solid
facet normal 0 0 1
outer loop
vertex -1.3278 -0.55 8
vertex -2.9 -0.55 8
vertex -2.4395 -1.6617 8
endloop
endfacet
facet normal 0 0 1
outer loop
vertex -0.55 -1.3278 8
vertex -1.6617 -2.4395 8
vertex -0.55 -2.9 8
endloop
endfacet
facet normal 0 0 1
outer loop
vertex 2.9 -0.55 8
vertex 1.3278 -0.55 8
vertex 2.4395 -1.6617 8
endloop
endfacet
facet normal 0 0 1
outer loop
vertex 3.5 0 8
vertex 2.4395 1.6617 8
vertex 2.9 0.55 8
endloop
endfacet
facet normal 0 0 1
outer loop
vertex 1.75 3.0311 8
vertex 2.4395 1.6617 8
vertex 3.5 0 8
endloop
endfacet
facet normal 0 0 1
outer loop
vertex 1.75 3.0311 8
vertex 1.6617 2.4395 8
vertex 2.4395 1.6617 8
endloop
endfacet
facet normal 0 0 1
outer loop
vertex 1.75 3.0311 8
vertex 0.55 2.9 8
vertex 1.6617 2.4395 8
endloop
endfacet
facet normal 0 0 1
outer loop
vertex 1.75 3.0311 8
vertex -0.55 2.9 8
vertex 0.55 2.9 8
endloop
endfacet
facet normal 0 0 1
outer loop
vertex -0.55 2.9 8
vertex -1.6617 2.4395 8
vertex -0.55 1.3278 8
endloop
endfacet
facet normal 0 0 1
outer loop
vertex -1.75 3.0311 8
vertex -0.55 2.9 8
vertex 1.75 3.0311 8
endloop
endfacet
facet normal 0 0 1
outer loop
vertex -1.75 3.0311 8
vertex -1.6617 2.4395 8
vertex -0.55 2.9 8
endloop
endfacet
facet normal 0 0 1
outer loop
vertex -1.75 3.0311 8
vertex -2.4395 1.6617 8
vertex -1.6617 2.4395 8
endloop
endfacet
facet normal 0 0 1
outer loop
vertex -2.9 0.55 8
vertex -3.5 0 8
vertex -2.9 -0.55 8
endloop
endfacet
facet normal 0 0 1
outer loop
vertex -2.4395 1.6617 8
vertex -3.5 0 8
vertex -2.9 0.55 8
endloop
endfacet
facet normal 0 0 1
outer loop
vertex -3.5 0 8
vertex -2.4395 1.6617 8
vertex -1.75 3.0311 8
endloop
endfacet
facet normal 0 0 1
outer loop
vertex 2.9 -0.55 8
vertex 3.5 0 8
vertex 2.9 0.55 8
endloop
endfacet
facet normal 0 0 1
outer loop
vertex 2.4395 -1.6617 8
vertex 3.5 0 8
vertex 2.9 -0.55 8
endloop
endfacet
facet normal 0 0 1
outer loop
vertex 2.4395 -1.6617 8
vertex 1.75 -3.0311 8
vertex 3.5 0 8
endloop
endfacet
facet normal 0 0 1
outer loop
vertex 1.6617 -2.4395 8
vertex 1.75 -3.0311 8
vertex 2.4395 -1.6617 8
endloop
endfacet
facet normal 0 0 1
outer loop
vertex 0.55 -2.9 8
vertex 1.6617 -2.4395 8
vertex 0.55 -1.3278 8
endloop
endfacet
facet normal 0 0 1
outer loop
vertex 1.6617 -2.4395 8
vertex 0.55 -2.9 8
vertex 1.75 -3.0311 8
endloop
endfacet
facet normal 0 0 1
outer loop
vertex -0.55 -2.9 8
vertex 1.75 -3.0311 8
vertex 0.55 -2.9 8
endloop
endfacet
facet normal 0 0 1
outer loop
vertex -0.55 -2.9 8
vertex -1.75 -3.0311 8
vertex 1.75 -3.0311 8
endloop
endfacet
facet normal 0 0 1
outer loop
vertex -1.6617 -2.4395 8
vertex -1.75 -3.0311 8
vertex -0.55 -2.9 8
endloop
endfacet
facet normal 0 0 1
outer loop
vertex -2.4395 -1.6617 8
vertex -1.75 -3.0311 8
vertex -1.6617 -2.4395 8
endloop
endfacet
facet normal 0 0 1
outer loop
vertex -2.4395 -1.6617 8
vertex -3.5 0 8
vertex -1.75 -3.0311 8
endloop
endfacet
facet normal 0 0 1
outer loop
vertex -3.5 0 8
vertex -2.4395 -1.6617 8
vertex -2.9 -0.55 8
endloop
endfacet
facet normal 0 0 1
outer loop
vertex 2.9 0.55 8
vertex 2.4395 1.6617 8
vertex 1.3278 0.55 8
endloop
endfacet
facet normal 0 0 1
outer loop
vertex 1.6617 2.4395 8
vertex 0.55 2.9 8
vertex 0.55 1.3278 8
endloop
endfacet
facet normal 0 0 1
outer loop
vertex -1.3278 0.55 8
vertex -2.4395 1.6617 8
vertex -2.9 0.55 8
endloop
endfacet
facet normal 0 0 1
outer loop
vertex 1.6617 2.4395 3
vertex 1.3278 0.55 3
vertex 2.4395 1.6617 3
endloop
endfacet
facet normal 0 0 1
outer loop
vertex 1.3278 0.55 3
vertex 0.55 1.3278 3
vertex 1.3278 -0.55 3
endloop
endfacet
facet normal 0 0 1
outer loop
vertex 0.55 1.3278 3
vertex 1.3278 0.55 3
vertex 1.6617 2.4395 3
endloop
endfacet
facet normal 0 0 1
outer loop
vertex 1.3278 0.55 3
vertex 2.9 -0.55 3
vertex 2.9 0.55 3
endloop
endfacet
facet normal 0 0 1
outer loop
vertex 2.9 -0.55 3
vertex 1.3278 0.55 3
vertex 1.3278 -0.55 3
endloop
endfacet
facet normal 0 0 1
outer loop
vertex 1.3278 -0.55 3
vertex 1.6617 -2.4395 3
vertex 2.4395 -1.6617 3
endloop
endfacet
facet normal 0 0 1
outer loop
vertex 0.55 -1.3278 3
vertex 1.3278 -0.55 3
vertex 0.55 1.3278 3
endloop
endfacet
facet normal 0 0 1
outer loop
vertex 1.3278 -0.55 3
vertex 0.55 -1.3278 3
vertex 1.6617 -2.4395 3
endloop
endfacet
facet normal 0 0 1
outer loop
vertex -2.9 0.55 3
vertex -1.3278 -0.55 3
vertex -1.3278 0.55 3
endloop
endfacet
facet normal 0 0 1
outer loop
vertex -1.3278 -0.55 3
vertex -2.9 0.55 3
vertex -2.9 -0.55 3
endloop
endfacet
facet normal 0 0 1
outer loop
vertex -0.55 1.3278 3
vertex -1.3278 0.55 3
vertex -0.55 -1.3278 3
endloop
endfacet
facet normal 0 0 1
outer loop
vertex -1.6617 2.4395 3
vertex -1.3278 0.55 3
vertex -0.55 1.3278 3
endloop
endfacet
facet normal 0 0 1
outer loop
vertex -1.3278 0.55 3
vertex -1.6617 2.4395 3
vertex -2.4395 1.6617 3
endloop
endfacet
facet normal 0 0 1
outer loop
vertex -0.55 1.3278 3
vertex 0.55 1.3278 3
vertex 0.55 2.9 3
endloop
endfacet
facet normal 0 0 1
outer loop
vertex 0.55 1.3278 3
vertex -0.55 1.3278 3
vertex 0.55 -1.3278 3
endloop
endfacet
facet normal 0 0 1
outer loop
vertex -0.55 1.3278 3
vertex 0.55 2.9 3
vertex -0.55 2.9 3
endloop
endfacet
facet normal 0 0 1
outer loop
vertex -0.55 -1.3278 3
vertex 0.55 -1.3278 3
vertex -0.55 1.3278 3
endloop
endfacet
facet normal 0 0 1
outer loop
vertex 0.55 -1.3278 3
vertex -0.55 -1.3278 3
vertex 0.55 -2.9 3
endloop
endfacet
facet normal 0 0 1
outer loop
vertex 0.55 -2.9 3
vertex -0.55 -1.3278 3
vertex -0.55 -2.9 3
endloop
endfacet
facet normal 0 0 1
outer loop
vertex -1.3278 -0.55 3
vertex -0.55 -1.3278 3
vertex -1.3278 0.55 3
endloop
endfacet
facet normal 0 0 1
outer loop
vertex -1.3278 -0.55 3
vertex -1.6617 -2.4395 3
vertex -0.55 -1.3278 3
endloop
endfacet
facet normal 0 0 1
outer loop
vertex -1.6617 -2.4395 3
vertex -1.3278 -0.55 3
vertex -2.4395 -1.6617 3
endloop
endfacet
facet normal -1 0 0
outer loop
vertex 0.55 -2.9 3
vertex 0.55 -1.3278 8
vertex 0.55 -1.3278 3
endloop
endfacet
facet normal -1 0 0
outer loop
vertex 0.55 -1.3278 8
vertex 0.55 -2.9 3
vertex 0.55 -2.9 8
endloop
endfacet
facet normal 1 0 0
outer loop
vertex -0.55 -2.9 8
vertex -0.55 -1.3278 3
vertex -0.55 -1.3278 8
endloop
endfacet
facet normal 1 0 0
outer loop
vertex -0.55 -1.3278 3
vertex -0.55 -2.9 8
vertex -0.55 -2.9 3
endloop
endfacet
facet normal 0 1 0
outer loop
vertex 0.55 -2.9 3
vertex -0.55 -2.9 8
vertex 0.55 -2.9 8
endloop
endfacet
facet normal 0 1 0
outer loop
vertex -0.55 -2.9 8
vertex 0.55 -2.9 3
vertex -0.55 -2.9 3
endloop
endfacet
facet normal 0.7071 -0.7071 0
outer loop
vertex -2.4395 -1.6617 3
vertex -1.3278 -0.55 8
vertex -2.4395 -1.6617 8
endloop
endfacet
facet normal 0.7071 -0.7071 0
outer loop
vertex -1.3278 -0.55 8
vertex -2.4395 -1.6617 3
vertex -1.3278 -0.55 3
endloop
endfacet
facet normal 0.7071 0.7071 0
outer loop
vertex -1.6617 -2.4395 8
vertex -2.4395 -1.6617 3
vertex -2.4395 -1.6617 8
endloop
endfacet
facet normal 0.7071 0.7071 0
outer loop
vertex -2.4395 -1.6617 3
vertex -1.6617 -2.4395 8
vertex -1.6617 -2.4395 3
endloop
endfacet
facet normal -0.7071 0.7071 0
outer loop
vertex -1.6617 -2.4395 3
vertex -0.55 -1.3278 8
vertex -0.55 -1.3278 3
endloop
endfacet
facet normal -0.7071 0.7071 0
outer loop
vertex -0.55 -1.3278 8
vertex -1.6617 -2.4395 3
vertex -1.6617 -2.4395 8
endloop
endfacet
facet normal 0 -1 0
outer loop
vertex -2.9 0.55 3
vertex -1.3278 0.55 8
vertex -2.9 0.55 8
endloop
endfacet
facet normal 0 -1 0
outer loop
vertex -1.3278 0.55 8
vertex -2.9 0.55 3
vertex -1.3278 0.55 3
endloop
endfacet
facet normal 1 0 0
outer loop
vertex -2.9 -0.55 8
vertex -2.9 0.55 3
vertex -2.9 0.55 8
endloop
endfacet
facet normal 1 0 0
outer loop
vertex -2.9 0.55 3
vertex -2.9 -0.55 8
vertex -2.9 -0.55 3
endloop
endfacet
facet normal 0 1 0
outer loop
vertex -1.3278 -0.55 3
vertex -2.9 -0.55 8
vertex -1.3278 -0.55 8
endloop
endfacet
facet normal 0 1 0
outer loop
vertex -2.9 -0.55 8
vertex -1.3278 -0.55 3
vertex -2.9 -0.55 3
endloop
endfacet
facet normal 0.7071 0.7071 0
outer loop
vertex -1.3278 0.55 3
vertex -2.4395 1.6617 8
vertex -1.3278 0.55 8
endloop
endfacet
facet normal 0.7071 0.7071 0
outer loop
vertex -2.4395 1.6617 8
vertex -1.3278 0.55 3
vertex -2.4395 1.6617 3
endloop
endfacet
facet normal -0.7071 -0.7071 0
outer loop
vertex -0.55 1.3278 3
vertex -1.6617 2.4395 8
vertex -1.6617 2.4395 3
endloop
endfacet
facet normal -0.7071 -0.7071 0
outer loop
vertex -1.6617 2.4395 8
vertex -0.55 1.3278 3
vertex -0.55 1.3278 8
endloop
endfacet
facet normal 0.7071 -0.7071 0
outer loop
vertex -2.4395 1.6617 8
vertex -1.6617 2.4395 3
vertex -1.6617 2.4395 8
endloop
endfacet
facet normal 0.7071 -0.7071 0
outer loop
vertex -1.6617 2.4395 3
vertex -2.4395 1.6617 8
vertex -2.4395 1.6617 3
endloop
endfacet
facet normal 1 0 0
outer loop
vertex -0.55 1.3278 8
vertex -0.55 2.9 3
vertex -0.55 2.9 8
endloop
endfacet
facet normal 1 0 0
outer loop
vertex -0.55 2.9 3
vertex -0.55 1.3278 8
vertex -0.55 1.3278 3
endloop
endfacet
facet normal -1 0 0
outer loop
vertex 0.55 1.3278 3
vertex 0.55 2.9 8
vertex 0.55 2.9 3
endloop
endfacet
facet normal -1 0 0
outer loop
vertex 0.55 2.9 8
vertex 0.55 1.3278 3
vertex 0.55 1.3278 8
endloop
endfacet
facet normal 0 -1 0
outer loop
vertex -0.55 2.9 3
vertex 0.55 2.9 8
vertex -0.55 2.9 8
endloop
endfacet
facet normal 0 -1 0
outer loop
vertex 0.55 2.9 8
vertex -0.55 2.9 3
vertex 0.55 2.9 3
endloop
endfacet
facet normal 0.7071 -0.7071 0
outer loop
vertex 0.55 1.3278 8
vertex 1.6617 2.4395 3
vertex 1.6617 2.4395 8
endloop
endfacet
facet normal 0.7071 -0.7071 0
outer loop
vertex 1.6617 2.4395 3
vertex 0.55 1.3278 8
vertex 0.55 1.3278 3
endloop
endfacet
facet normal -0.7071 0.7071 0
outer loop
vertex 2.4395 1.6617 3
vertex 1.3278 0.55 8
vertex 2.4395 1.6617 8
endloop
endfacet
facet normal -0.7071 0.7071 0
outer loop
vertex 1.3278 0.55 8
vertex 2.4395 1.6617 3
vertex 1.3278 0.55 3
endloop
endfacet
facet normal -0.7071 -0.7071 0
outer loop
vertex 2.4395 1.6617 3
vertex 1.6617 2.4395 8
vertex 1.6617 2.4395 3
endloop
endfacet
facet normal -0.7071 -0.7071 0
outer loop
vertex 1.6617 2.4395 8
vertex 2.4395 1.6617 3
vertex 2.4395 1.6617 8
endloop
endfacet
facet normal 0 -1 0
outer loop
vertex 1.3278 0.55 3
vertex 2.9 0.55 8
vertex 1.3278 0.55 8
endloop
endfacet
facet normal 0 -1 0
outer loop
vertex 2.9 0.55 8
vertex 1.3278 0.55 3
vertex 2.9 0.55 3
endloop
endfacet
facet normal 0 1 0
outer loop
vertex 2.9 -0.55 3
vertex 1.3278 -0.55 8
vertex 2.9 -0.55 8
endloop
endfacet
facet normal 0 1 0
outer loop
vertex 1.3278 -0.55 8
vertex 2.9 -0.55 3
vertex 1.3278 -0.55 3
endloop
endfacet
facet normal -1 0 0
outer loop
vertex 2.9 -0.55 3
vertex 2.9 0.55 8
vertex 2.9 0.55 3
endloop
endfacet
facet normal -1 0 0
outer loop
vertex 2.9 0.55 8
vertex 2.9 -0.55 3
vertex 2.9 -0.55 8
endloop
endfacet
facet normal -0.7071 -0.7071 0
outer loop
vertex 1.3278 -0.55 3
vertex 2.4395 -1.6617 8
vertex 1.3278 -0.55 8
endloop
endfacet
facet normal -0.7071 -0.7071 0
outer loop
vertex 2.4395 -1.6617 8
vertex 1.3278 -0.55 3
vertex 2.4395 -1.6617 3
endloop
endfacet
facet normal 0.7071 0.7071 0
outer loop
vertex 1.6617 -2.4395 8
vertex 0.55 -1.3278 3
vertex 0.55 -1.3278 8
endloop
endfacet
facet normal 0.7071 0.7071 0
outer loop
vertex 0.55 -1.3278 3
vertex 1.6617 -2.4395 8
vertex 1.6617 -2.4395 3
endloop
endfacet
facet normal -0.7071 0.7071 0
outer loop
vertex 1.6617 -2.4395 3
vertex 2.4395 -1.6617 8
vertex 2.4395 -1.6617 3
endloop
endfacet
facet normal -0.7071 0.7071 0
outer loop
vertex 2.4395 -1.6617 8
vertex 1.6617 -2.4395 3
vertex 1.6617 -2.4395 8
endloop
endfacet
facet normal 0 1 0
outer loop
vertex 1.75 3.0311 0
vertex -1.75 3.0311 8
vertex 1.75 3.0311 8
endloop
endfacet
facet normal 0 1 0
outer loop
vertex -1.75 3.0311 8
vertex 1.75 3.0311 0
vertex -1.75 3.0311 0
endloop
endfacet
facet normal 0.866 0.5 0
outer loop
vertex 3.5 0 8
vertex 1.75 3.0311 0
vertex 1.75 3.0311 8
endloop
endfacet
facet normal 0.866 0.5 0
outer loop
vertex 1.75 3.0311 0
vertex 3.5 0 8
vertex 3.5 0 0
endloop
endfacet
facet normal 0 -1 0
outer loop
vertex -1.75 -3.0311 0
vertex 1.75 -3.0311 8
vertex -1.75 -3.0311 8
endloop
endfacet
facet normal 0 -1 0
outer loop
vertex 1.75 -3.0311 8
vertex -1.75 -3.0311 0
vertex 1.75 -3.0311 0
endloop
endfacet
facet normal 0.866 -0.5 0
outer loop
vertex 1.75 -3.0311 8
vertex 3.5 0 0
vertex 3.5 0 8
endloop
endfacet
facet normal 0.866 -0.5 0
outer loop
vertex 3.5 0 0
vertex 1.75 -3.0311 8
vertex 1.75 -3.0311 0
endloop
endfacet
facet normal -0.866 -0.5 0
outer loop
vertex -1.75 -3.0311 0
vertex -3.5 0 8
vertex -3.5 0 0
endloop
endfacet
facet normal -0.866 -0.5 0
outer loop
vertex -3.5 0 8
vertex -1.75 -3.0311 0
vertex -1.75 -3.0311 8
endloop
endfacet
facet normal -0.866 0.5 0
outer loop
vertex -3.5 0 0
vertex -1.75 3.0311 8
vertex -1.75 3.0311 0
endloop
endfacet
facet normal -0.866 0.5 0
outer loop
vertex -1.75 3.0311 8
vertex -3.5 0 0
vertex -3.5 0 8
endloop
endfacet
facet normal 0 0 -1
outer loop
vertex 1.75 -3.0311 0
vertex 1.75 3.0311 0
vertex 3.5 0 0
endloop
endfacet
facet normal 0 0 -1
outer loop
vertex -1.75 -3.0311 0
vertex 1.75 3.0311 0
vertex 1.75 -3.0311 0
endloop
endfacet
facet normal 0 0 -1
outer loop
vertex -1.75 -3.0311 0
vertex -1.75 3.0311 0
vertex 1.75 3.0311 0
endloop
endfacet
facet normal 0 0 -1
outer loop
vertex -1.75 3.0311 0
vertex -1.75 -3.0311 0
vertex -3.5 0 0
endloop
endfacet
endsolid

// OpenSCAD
// file: MetalGear.scad
/** Created by Jose Araujo. 2014-06-06
	Simple gear (like the ones coming in hobby
	metal motors).
*/
pi = 3.1415926535897932384626433;

module Gear ( 
			shaft // center shaft radio
			, h  // length of shaft
			, gr //gear radio
			, nt //number of tooth. 
			, td //teeth depth.			
			, hollow_shaft // indicates if the shaft is solid or if it a holow
			, ringr // the radius of the ring that holds the tooth together
) {
c = 2*pi *shaft; // circumference of shaft

if ( hollow_shaft == 0 )  
    cylinder ( h= h, r= shaft , $fn= 50 );

//  ring for tooth.
difference (){
    cylinder( h= h, r= ringr, $fn = 50 ) ;
    cylinder( h = h, r=shaft, $fn = 50 ) ;
}

// tooth
for ( i= [0: (nt -1)] ){	
	
	//translate ( [-sin( a)* shaft,cos(a) *shaft,0])
	rotate( [0,0, i*360/nt]) 
//	translate ( [-c/(nt*2)/2, shaft,0])
//	cube (size=[c/(nt*2),gr-shaft, h]);
	translate ( [-td/2, shaft,0])
	cube (size=[td,gr-shaft, h]);
}
}


Gear ( shaft= 0.95,  // center shaft radio
			h = 5, // lenght of shaft
	gr = 2.5 , //gear radio
nt = 8, //number of tooth. 
td = 0.5, //teeth depth.
hollow_shaft = 1, // indicates if the shaft is solid or if it a holow
ringr = 1 // the radius of the ring that holds the tooth together
) ;
// file: Hex.scad
/** Created by Jose Araujo. 2014-6-7.

    Just standard hex key (parametric) with no handle; 
*/


module Hex(
				radius // radius in mm
				, h // height of hex
		 ){
cylinder ( r= radius, h =h, $fn = 6 ) ;
}

Hex(radius = 5,h  = 25);
// main file
use <Hex.scad>
use <MetalGear.scad>


module GearHexBox ( ){
//translate ( [0,0,8])
//Hex(radius= 3.5,h = 8) ;

difference (){
	Hex(radius = 3.5, h  = 8);
Gear ( shaft= 0.95,  // center shaft radio
			h = 5, // lenght of shaft
	gr = 2.9 , //gear radio
nt = 8, //number of tooth. 
td = 1.1, //teeth depth.
hollow_shaft = 0, // indicates if the shaft is solid or if it a holow
ringr = 1.2 // the radius of the ring that holds the tooth together
) ;
}
}

translate ( [0,0,8])
rotate ( [180,0,0])
GearHexBox();
